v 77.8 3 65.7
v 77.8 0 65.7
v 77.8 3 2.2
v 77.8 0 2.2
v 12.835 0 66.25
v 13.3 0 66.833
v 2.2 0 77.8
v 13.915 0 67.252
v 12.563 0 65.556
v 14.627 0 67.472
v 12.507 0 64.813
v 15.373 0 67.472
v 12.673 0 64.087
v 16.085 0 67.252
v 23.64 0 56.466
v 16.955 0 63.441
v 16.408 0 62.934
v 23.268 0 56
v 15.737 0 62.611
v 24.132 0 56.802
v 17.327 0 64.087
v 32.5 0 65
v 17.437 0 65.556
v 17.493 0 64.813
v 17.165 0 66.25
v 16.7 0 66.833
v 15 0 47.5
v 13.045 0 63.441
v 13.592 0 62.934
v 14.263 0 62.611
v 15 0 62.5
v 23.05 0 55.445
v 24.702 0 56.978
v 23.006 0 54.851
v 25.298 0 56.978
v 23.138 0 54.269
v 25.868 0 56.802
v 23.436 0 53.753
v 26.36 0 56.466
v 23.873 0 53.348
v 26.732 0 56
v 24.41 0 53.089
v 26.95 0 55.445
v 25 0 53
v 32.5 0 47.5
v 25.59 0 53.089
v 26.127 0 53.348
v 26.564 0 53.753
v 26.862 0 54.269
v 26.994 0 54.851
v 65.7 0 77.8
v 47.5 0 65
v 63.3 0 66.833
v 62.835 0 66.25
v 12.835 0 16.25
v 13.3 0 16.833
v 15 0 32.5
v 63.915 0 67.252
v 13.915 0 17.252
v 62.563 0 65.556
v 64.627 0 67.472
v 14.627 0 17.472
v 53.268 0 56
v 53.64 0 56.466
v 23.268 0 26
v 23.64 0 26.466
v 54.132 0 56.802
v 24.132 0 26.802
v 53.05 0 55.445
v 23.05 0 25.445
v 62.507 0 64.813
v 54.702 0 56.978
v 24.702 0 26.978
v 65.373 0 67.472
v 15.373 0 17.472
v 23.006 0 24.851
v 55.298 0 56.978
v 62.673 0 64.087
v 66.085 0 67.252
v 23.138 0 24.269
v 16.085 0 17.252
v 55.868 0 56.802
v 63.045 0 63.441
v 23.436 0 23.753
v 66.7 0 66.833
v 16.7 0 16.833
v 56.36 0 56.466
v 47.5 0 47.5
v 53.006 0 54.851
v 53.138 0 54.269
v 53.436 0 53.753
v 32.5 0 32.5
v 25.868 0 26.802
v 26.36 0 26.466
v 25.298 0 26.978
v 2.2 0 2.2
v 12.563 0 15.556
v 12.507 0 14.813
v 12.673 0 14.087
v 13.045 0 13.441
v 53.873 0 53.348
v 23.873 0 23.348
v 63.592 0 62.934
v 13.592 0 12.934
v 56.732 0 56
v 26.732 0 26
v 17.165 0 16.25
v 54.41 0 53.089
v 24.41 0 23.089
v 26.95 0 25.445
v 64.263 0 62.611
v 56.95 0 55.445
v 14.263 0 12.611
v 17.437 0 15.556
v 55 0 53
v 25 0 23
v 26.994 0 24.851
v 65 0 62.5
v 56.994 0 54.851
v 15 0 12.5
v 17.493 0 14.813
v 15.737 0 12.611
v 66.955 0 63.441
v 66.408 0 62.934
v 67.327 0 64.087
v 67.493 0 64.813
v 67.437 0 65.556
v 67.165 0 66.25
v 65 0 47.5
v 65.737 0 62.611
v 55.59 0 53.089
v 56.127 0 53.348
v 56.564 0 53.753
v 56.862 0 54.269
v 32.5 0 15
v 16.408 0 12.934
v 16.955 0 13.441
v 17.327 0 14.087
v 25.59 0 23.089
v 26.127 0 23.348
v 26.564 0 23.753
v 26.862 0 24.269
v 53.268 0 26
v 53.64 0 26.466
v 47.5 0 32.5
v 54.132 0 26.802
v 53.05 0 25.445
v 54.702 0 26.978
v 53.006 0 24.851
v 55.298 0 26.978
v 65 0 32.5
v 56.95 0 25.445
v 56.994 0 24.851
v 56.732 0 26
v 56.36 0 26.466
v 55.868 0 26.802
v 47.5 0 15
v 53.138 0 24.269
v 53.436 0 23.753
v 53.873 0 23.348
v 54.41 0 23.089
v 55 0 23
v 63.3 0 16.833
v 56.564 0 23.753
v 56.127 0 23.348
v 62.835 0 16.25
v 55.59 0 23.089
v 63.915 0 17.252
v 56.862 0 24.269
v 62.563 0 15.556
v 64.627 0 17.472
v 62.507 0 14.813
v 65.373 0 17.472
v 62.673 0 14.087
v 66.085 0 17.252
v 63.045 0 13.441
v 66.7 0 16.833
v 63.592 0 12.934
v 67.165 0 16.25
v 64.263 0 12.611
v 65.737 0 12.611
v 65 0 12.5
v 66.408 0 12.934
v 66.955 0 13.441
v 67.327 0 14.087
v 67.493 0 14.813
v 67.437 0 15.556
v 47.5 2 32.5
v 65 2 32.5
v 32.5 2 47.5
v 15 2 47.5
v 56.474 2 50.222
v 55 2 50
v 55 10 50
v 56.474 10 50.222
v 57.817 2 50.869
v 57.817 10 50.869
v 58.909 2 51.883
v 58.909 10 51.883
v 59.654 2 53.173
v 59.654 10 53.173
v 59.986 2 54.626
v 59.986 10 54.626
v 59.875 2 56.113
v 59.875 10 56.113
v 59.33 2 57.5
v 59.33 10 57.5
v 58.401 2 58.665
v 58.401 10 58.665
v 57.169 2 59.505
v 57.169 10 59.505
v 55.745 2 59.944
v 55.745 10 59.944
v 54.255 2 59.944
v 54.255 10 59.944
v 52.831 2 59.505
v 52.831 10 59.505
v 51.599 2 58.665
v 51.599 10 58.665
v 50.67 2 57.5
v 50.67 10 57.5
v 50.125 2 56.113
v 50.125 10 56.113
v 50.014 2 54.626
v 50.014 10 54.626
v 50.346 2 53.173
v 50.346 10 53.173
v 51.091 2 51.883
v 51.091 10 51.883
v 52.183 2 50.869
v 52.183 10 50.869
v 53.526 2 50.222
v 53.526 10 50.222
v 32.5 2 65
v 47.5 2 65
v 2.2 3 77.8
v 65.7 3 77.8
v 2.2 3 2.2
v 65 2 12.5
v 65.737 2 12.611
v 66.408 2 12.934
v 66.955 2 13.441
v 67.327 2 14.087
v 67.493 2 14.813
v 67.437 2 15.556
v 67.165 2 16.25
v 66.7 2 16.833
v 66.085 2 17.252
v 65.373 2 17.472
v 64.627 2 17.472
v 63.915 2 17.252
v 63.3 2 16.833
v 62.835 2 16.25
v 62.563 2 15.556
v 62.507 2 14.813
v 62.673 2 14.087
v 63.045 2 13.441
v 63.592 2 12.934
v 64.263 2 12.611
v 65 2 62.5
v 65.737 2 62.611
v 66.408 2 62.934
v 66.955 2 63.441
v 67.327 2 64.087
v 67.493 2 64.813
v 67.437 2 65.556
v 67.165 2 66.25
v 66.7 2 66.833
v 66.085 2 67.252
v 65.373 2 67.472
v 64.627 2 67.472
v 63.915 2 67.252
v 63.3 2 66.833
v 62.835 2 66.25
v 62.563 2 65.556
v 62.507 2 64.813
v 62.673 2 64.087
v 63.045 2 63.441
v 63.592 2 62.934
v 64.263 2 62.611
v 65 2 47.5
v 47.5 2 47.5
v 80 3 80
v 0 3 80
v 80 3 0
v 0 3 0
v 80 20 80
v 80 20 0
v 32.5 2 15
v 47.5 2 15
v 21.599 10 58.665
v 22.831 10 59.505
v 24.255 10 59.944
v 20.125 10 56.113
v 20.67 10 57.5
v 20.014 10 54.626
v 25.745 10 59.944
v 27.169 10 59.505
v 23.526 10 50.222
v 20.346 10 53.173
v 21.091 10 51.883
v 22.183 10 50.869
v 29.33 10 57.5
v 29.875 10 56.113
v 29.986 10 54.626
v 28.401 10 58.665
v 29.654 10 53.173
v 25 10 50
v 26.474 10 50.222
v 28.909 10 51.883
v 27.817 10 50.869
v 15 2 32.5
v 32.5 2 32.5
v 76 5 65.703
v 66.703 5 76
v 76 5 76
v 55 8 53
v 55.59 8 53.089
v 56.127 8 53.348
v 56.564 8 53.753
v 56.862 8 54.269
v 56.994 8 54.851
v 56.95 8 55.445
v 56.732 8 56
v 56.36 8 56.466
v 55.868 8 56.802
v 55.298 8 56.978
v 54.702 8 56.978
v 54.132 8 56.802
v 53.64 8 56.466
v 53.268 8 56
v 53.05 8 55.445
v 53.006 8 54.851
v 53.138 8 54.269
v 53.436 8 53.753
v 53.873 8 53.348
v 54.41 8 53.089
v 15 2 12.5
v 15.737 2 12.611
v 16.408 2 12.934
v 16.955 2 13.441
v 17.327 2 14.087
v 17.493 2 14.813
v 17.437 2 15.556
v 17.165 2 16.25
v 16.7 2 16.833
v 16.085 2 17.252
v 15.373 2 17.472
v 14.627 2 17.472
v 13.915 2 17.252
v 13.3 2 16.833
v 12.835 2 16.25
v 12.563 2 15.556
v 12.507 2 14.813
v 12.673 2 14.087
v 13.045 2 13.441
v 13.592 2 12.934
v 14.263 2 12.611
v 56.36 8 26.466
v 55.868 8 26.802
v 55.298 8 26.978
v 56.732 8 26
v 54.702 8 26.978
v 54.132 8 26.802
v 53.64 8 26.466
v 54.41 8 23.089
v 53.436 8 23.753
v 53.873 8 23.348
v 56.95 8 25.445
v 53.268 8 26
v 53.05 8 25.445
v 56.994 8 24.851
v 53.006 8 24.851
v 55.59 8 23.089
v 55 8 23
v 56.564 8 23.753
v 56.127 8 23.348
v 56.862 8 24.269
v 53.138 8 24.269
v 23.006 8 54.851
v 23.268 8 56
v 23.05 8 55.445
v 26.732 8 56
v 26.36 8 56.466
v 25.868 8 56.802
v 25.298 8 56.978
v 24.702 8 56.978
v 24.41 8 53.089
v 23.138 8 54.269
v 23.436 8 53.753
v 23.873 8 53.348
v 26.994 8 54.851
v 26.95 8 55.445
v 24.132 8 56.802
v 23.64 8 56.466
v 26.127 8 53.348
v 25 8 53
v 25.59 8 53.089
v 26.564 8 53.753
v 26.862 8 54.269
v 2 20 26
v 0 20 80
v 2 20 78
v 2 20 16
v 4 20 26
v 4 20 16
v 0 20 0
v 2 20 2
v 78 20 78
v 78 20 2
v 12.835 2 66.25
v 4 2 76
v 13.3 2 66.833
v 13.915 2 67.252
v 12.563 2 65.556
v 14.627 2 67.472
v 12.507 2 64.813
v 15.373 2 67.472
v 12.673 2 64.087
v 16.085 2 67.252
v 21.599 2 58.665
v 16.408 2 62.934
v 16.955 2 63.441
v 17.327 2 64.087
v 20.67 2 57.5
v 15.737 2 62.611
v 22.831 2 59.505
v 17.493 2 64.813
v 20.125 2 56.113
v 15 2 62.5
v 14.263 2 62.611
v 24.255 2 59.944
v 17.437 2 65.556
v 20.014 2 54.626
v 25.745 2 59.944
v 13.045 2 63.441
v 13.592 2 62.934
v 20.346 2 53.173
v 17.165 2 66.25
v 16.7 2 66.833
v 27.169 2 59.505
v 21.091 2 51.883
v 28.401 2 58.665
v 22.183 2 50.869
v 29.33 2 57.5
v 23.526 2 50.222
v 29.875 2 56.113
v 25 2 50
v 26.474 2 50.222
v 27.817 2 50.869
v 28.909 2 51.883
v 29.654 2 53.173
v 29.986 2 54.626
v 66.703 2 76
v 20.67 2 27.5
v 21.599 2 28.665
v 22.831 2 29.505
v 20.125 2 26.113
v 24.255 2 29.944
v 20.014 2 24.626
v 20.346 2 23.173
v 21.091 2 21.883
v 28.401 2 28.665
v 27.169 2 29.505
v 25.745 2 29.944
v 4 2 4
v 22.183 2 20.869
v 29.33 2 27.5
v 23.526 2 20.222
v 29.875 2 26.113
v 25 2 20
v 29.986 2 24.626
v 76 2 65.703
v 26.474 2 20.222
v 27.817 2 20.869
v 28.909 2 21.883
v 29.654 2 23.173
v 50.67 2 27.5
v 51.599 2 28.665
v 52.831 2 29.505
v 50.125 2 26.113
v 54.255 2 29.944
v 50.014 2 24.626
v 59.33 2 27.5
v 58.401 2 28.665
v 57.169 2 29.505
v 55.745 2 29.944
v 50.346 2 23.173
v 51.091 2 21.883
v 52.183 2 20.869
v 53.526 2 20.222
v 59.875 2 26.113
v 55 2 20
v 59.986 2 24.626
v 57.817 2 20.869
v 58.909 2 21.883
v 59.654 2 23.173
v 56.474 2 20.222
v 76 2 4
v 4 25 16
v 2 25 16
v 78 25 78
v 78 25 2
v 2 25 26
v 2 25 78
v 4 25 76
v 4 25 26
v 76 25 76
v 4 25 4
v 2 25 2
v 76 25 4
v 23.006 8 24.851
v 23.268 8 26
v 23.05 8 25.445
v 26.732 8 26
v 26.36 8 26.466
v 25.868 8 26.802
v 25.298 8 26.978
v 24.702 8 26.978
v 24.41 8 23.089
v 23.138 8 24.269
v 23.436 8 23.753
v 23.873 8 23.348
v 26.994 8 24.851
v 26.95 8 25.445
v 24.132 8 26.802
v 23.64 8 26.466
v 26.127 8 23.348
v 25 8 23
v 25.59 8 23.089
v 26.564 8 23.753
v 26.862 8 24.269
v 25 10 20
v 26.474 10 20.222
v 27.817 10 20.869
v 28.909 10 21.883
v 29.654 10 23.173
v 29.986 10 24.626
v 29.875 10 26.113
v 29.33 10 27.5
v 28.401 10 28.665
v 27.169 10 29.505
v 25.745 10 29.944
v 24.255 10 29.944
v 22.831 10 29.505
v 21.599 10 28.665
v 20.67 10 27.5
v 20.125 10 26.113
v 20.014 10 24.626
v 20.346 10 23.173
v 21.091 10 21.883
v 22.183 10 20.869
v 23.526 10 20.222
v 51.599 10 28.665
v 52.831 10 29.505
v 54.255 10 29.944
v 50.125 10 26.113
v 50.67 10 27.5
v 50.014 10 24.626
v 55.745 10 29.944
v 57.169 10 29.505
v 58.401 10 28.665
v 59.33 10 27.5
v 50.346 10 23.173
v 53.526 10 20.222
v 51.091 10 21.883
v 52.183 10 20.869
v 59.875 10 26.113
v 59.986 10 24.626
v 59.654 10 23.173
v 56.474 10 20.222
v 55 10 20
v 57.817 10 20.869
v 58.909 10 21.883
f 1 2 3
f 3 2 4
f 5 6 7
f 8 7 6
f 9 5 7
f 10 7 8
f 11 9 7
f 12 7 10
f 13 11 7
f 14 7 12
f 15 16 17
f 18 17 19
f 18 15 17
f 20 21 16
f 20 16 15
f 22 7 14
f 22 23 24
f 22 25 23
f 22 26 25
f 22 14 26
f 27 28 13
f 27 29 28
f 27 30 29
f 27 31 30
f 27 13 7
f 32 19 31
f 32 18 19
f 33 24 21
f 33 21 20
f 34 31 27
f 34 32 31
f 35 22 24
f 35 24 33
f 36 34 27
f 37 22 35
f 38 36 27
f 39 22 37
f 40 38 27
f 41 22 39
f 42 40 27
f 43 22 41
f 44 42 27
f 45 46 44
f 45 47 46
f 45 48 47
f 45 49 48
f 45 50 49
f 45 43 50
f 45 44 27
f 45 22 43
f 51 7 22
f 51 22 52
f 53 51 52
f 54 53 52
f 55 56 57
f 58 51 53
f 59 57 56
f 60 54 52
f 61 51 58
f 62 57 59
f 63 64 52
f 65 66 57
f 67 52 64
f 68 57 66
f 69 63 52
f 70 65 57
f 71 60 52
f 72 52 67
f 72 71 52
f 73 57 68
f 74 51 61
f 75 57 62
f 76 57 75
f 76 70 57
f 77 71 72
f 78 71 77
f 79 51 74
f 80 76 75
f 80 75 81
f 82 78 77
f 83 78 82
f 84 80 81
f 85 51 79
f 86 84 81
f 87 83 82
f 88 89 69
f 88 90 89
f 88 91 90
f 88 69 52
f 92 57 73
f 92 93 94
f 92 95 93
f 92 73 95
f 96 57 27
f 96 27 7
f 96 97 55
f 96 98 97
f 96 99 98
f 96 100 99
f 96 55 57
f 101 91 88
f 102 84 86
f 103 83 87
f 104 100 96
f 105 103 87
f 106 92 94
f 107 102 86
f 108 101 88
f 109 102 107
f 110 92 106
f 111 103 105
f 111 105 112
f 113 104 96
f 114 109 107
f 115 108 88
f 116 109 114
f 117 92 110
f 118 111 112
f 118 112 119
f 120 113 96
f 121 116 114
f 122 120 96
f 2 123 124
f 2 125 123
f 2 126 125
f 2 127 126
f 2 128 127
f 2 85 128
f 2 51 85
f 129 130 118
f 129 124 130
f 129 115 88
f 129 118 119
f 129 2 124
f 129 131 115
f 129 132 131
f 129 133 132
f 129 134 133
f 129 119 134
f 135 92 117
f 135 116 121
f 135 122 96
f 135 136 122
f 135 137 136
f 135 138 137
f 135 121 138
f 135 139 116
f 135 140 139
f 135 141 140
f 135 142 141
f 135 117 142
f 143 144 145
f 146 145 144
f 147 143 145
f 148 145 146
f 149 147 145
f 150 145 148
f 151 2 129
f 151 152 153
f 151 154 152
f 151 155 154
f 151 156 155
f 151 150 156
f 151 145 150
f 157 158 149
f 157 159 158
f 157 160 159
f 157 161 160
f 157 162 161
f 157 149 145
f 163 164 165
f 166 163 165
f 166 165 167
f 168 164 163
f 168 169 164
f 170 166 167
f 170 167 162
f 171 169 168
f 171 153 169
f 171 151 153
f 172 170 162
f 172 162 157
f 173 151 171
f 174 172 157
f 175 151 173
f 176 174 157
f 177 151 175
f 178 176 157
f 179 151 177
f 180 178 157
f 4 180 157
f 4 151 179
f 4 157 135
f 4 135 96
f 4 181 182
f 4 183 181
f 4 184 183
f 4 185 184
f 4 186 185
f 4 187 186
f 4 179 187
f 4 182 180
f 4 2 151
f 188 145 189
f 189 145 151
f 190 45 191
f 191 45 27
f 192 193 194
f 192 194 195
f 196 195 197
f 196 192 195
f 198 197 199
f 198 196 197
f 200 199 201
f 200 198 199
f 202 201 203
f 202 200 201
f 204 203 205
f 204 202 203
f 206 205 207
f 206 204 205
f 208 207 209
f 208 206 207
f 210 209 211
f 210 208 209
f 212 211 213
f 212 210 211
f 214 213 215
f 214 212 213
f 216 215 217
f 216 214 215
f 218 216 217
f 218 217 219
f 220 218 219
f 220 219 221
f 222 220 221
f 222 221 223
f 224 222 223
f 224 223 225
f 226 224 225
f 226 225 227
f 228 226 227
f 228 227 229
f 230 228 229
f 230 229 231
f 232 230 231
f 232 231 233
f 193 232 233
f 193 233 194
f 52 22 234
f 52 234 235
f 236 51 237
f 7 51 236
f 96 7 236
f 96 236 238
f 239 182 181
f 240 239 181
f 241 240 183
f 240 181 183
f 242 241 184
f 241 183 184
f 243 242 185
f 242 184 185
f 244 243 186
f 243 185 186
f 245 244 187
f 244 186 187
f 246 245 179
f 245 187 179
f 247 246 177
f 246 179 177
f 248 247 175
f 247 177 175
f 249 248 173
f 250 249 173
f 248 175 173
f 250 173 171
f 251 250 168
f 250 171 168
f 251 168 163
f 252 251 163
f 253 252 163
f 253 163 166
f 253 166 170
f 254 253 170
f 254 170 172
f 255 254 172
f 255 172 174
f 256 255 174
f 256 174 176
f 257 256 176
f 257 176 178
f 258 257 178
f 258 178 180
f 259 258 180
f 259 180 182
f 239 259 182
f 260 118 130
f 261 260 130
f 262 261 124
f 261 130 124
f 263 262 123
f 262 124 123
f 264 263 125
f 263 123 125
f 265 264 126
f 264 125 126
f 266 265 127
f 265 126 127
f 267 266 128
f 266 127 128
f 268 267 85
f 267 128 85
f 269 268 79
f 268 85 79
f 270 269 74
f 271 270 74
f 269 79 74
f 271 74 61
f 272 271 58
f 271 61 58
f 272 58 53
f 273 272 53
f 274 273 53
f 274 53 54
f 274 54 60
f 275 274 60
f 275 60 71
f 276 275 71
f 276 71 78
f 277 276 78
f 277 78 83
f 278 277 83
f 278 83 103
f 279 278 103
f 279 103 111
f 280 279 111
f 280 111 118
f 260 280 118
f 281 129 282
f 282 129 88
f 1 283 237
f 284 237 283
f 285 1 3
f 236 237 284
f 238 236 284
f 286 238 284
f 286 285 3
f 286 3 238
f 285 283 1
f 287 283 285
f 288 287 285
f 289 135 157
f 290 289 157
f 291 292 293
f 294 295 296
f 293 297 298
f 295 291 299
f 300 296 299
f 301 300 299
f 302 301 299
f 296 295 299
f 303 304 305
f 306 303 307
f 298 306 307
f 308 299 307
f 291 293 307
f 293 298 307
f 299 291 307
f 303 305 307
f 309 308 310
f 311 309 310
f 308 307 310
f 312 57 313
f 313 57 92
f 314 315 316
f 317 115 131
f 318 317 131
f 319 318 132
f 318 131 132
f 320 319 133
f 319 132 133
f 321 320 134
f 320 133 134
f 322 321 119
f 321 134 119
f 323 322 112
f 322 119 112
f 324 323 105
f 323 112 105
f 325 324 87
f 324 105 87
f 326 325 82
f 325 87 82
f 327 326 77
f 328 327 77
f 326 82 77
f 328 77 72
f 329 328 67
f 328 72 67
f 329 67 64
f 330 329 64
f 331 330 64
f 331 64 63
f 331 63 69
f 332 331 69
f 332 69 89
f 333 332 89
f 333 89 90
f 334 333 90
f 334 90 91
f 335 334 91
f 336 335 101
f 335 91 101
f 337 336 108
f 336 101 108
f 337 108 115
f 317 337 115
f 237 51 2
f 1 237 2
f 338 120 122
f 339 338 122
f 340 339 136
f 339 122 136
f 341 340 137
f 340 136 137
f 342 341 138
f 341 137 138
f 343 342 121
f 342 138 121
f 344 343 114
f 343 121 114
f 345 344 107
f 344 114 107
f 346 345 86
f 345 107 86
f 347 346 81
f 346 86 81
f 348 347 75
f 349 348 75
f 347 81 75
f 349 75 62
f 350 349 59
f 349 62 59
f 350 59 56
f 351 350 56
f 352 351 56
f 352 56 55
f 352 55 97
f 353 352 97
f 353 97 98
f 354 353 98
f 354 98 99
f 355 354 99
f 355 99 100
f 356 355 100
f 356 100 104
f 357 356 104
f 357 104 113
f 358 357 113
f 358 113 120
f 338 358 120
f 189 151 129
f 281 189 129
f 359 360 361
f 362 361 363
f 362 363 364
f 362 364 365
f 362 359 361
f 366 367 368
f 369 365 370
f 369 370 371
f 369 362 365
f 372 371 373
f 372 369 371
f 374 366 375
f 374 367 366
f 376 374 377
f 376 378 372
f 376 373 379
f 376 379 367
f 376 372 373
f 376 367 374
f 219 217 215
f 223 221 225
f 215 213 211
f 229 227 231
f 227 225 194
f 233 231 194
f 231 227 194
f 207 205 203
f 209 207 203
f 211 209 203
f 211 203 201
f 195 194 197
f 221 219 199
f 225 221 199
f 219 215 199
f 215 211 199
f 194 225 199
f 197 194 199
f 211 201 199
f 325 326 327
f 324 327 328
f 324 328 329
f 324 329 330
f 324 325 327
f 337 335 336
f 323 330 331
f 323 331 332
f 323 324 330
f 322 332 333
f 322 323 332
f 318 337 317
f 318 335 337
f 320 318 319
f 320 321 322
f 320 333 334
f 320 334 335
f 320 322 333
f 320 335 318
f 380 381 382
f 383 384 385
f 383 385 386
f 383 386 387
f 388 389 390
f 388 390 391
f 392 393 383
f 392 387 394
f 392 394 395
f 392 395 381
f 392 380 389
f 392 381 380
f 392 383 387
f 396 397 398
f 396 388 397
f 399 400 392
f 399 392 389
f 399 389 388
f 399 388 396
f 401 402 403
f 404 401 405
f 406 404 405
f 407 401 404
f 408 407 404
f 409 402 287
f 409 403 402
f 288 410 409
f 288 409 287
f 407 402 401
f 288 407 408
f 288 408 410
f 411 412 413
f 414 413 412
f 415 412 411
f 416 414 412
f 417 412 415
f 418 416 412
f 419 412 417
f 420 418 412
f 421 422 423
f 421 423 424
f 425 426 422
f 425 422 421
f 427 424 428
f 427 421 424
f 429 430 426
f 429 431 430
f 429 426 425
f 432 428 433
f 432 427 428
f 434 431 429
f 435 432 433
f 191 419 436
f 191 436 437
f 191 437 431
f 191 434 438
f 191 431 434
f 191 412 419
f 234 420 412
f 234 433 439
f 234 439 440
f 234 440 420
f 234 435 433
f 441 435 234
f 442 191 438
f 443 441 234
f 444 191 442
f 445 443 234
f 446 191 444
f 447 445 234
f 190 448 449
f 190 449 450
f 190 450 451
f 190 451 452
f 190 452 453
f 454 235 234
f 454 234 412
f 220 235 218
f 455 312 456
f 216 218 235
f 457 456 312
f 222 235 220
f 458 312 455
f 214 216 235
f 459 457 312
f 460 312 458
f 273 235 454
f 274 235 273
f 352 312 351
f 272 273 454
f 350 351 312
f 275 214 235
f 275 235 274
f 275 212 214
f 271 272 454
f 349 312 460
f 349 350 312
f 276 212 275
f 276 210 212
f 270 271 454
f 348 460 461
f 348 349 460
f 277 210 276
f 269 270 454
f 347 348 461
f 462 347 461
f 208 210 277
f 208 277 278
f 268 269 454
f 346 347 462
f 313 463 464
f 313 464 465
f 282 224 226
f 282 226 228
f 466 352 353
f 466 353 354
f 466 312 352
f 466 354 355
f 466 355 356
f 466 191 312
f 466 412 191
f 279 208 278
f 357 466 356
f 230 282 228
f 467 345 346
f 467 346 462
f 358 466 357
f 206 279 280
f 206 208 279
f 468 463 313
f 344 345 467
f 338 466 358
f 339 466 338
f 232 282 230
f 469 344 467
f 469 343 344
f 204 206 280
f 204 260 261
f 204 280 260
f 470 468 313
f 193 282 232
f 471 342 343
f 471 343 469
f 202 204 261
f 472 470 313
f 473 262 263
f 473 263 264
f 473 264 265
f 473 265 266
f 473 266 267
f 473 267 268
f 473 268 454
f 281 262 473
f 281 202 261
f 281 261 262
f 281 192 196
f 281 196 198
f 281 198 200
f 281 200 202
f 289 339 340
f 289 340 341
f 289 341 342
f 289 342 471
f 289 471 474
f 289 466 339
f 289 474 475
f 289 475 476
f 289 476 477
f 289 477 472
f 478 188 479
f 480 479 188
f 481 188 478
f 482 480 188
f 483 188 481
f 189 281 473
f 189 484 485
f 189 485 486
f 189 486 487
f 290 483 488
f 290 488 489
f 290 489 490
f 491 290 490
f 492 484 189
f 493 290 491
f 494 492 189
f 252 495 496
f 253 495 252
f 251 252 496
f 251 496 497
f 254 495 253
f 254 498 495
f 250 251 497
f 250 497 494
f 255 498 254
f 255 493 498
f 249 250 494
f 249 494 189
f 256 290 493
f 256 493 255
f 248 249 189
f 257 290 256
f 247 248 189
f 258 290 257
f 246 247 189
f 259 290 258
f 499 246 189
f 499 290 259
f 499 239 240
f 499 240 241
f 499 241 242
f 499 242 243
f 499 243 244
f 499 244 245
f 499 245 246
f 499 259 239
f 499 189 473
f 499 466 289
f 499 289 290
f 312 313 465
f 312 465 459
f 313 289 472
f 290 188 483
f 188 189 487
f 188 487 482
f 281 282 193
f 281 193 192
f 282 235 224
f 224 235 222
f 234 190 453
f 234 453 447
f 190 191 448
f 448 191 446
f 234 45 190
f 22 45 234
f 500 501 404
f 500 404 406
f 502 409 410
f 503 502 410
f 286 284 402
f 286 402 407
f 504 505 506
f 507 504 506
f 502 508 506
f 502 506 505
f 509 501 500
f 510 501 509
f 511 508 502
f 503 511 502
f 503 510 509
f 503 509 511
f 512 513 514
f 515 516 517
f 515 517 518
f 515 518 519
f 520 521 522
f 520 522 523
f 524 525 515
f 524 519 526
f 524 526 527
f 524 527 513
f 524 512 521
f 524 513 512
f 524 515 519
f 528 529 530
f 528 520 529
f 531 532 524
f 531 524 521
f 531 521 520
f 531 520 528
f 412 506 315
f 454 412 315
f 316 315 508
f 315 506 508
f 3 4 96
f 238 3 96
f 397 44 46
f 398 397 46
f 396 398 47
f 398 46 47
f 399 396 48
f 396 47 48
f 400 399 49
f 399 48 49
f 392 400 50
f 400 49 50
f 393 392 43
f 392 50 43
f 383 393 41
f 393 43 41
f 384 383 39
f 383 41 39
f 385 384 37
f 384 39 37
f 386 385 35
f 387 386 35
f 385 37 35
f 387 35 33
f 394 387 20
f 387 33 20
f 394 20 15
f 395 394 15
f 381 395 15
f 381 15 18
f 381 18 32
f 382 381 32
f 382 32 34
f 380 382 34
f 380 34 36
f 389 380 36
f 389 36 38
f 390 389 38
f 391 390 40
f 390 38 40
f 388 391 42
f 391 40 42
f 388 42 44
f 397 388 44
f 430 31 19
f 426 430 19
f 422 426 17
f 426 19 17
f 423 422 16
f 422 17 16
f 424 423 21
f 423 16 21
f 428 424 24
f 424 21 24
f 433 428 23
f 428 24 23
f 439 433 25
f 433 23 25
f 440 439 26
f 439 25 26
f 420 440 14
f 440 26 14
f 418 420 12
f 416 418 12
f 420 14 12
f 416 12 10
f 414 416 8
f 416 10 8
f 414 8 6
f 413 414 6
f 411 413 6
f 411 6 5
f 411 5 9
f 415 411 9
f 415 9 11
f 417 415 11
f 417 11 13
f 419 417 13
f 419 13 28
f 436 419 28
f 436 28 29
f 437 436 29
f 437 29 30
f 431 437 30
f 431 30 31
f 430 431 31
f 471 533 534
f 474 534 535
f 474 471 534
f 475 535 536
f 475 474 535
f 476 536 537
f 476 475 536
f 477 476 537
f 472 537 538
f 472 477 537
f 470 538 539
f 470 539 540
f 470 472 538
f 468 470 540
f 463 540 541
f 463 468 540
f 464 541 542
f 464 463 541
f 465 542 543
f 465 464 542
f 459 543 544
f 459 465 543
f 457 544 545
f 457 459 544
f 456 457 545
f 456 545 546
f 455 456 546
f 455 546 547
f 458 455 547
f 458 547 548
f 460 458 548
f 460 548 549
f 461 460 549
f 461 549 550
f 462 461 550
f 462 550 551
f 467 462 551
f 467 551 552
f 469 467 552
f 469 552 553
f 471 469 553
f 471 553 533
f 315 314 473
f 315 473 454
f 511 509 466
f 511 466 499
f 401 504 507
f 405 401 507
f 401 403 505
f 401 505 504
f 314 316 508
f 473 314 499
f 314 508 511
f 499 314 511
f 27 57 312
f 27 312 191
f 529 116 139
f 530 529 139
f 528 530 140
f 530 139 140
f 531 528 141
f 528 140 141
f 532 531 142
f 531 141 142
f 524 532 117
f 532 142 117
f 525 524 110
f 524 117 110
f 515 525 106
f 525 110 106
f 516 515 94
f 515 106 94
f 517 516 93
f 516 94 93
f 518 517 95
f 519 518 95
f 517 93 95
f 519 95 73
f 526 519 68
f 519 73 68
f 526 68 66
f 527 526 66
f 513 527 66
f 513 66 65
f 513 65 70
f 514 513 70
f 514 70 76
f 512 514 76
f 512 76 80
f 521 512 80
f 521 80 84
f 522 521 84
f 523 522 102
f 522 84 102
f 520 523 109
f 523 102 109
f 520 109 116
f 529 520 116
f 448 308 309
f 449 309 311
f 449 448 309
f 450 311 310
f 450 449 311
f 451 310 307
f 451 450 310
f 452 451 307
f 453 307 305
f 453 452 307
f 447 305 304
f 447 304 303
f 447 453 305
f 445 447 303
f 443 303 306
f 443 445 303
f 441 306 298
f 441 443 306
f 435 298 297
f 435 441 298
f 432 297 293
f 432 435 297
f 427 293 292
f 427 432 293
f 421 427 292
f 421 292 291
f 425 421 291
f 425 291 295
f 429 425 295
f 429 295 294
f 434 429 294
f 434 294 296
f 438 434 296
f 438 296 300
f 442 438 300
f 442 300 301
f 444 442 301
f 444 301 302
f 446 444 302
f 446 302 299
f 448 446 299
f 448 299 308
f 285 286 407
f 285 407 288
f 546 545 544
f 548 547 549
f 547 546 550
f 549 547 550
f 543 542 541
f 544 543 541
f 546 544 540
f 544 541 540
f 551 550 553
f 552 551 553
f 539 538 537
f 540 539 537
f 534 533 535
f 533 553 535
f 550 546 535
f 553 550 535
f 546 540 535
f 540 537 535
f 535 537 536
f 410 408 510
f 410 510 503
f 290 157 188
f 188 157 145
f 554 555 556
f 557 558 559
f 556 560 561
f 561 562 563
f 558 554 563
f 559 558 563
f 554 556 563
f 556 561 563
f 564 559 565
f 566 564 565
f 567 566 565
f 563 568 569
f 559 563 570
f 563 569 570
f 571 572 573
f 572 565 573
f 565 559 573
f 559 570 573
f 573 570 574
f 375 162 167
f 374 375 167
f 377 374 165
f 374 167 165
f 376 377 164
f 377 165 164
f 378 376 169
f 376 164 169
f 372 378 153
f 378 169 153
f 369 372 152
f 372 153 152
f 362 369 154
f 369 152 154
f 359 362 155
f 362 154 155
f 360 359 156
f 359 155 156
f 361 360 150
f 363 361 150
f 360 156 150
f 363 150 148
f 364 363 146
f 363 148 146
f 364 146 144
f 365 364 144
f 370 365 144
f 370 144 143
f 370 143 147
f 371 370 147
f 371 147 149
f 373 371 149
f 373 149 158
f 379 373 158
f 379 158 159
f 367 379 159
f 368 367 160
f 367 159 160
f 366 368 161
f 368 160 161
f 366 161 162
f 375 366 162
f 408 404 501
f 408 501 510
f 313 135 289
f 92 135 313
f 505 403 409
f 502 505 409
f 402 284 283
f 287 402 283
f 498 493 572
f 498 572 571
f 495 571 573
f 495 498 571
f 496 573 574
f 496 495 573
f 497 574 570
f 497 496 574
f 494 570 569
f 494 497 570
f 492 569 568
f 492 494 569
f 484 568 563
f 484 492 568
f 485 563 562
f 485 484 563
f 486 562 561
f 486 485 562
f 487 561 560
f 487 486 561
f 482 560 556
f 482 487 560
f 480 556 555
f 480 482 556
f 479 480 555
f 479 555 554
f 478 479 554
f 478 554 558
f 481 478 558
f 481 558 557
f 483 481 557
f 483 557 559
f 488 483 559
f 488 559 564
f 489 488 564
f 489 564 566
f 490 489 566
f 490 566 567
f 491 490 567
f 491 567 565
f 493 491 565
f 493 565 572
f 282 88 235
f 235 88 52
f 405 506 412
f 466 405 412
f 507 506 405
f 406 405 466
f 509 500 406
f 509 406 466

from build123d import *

# Parameters (mm, degrees)
ESQUISSE1_W              = 80
ESQUISSE1_H              = 80
BOSS_EXTRU_1_DEPTH       = 20
ESQUISSE2_W              = 76
ESQUISSE2_H              = 76
BOSS_EXTRU_2_DEPTH       = 5
ESQUISSE3_W              = 72
ESQUISSE3_H              = 72
ENL_V_MAT_EXTRU_2_DEPTH  = 23
ESQUISSE4_W              = 15
ESQUISSE4_H              = 17.5
ESQUISSE4_W_2            = 17.5
ESQUISSE4_H_2            = 15
ENL_V_MAT_EXTRU_9_DEPTH  = 10
ESQUISSE7_R              = 2.5
ENL_V_MAT_EXTRU_4_DEPTH  = 10
ESQUISSE5_R              = 5
BOSS_EXTRU_6_DEPTH       = 10
ESQUISSE9_R              = 2
ENL_V_MAT_EXTRU_6_DEPTH  = 8
ESQUISSE10_W             = 2
ESQUISSE10_H             = 10
ENL_V_MAT_EXTRU_7_DEPTH  = 5
ESQUISSE11_OUTSIDE_W     = 105.174
ESQUISSE11_OUTSIDE_H     = 105.174
ESQUISSE11_OUTSIDE_W_2   = 75.6
ESQUISSE11_OUTSIDE_H_2   = 75.6
ENL_V_MAT_EXTRU_10_DEPTH = 3
BOSS_EXTRU_7_REACH       = 131.891
BOSS_EXTRU_7_START       = -15
ENL_V_MAT_EXTRU_11_DEPTH = 3


with BuildPart() as part:
    # Esquisse1 → Boss.-Extru.1 (new body)
    with BuildSketch(Plane(origin=(0, 0, 0), x_dir=(1, 0, 0), z_dir=(0, 1, 0))):
        with Locations((40, -40)):
            Rectangle(ESQUISSE1_W, ESQUISSE1_H)
    extrude(amount=BOSS_EXTRU_1_DEPTH)

    # Esquisse2 → Boss.-Extru.2 (add)
    with BuildSketch(Plane(origin=(0, 20, 0), x_dir=(1, 0, 0), z_dir=(0, 1, 0))):
        with Locations((40, -40)):
            Rectangle(ESQUISSE2_W, ESQUISSE2_H)
    extrude(amount=BOSS_EXTRU_2_DEPTH)

    # Esquisse3 → Enlèv. mat.-Extru.2 (cut)
    with BuildSketch(Plane(origin=(0, 25, 0), x_dir=(1, 0, 0), z_dir=(0, 1, 0))):
        with Locations((40, -40)):
            Rectangle(ESQUISSE3_W, ESQUISSE3_H)
    extrude(amount=-ENL_V_MAT_EXTRU_2_DEPTH, mode=Mode.SUBTRACT)

    # Esquisse4 → Enlèv. mat.-Extru.9 (cut)
    with BuildSketch(Plane.XZ):
        with Locations((40, 23.75)):
            Rectangle(ESQUISSE4_W, ESQUISSE4_H)
        with Locations((23.75, 40)):
            Rectangle(ESQUISSE4_W_2, ESQUISSE4_H_2)
        with Locations((40, 40)):
            Rectangle(ESQUISSE4_W, ESQUISSE4_H_2)
        with Locations((56.25, 40)):
            Rectangle(ESQUISSE4_W_2, ESQUISSE4_H_2)
        with Locations((40, 56.25)):
            Rectangle(ESQUISSE4_W, ESQUISSE4_H)
    extrude(amount=-ENL_V_MAT_EXTRU_9_DEPTH, mode=Mode.SUBTRACT)

    # Esquisse7 → Enlèv. mat.-Extru.4 (cut)
    with BuildSketch(Plane(origin=(0, 0, 0), x_dir=(-1, 0, 0), z_dir=(0, -1, 0))):
        with Locations(Location((-15, -15, 0), (0, 0, 90))):
            Circle(ESQUISSE7_R)
        with Locations(Location((-15, -65, 0), (0, 0, 90))):
            Circle(ESQUISSE7_R)
        with Locations(Location((-65, -15, 0), (0, 0, 90))):
            Circle(ESQUISSE7_R)
        with Locations(Location((-65, -65, 0), (0, 0, 90))):
            Circle(ESQUISSE7_R)
    extrude(amount=-ENL_V_MAT_EXTRU_4_DEPTH, mode=Mode.SUBTRACT)

    # Esquisse5 → Boss.-Extru.6 (add)
    with BuildSketch(Plane(origin=(0, 0, 0), x_dir=(-1, 0, 0), z_dir=(0, -1, 0))):
        with Locations(Location((-55, -25, 0), (0, 0, 90))):
            Circle(ESQUISSE5_R)
        with Locations(Location((-55, -55, 0), (0, 0, 90))):
            Circle(ESQUISSE5_R)
        with Locations(Location((-25, -55, 0), (0, 0, 90))):
            Circle(ESQUISSE5_R)
        with Locations(Location((-25, -25, 0), (0, 0, 90))):
            Circle(ESQUISSE5_R)
    extrude(amount=-BOSS_EXTRU_6_DEPTH)

    # Esquisse9 → Enlèv. mat.-Extru.6 (cut)
    with BuildSketch(Plane(origin=(0, 0, 0), x_dir=(-1, 0, 0), z_dir=(0, -1, 0))):
        with Locations(Location((-55, -25, 0), (0, 0, 90))):
            Circle(ESQUISSE9_R)
        with Locations(Location((-55, -55, 0), (0, 0, 90))):
            Circle(ESQUISSE9_R)
        with Locations(Location((-25, -25, 0), (0, 0, 90))):
            Circle(ESQUISSE9_R)
        with Locations(Location((-25, -55, 0), (0, 0, 90))):
            Circle(ESQUISSE9_R)
    extrude(amount=-ENL_V_MAT_EXTRU_6_DEPTH, mode=Mode.SUBTRACT)

    # Esquisse10 → Enlèv. mat.-Extru.7 (cut)
    with BuildSketch(Plane(origin=(0, 25, 0), x_dir=(1, 0, 0), z_dir=(0, 1, 0))):
        with Locations((3, -21)):
            Rectangle(ESQUISSE10_W, ESQUISSE10_H)
    extrude(amount=-ENL_V_MAT_EXTRU_7_DEPTH, mode=Mode.SUBTRACT)

    # Esquisse11 outside → Enlèv. mat.-Extru.10 (cut)
    with BuildSketch(Plane(origin=(0, 0, 0), x_dir=(-1, 0, 0), z_dir=(0, -1, 0))):
        with Locations((-40, -40)):
            Rectangle(ESQUISSE11_OUTSIDE_W, ESQUISSE11_OUTSIDE_H)
        with Locations((-40, -40)):
            Rectangle(ESQUISSE11_OUTSIDE_W_2, ESQUISSE11_OUTSIDE_H_2, mode=Mode.SUBTRACT)
    extrude(amount=-ENL_V_MAT_EXTRU_10_DEPTH, mode=Mode.SUBTRACT)

    # Esquisse14 → Boss.-Extru.7 (add, up to next)
    with BuildSketch(Plane(origin=(0, 20, 0), x_dir=(1, 0, 0), z_dir=(0, 1, 0)).offset(BOSS_EXTRU_7_START), mode=Mode.PRIVATE) as boss_extru_7_sk1:
        Polygon((76, -76), (76, -65.703145172), (66.703318607, -76), align=None)
    boss_extru_7_tool1 = extrude(boss_extru_7_sk1.sketch, amount=-BOSS_EXTRU_7_REACH, mode=Mode.PRIVATE) - part.part
    add(boss_extru_7_tool1.solids().sort_by_distance((72.901106, 5, 72.567715))[0])

    # Esquisse13 → Enlèv. mat.-Extru.11 (cut)
    with BuildSketch(Plane(origin=(0, 0, 0), x_dir=(-1, 0, 0), z_dir=(0, -1, 0))):
        Polygon((-63.5, -80), (-80, -63.5), (-80, -80), align=None)
    extrude(amount=-ENL_V_MAT_EXTRU_11_DEPTH, mode=Mode.SUBTRACT)


solid = part.part
